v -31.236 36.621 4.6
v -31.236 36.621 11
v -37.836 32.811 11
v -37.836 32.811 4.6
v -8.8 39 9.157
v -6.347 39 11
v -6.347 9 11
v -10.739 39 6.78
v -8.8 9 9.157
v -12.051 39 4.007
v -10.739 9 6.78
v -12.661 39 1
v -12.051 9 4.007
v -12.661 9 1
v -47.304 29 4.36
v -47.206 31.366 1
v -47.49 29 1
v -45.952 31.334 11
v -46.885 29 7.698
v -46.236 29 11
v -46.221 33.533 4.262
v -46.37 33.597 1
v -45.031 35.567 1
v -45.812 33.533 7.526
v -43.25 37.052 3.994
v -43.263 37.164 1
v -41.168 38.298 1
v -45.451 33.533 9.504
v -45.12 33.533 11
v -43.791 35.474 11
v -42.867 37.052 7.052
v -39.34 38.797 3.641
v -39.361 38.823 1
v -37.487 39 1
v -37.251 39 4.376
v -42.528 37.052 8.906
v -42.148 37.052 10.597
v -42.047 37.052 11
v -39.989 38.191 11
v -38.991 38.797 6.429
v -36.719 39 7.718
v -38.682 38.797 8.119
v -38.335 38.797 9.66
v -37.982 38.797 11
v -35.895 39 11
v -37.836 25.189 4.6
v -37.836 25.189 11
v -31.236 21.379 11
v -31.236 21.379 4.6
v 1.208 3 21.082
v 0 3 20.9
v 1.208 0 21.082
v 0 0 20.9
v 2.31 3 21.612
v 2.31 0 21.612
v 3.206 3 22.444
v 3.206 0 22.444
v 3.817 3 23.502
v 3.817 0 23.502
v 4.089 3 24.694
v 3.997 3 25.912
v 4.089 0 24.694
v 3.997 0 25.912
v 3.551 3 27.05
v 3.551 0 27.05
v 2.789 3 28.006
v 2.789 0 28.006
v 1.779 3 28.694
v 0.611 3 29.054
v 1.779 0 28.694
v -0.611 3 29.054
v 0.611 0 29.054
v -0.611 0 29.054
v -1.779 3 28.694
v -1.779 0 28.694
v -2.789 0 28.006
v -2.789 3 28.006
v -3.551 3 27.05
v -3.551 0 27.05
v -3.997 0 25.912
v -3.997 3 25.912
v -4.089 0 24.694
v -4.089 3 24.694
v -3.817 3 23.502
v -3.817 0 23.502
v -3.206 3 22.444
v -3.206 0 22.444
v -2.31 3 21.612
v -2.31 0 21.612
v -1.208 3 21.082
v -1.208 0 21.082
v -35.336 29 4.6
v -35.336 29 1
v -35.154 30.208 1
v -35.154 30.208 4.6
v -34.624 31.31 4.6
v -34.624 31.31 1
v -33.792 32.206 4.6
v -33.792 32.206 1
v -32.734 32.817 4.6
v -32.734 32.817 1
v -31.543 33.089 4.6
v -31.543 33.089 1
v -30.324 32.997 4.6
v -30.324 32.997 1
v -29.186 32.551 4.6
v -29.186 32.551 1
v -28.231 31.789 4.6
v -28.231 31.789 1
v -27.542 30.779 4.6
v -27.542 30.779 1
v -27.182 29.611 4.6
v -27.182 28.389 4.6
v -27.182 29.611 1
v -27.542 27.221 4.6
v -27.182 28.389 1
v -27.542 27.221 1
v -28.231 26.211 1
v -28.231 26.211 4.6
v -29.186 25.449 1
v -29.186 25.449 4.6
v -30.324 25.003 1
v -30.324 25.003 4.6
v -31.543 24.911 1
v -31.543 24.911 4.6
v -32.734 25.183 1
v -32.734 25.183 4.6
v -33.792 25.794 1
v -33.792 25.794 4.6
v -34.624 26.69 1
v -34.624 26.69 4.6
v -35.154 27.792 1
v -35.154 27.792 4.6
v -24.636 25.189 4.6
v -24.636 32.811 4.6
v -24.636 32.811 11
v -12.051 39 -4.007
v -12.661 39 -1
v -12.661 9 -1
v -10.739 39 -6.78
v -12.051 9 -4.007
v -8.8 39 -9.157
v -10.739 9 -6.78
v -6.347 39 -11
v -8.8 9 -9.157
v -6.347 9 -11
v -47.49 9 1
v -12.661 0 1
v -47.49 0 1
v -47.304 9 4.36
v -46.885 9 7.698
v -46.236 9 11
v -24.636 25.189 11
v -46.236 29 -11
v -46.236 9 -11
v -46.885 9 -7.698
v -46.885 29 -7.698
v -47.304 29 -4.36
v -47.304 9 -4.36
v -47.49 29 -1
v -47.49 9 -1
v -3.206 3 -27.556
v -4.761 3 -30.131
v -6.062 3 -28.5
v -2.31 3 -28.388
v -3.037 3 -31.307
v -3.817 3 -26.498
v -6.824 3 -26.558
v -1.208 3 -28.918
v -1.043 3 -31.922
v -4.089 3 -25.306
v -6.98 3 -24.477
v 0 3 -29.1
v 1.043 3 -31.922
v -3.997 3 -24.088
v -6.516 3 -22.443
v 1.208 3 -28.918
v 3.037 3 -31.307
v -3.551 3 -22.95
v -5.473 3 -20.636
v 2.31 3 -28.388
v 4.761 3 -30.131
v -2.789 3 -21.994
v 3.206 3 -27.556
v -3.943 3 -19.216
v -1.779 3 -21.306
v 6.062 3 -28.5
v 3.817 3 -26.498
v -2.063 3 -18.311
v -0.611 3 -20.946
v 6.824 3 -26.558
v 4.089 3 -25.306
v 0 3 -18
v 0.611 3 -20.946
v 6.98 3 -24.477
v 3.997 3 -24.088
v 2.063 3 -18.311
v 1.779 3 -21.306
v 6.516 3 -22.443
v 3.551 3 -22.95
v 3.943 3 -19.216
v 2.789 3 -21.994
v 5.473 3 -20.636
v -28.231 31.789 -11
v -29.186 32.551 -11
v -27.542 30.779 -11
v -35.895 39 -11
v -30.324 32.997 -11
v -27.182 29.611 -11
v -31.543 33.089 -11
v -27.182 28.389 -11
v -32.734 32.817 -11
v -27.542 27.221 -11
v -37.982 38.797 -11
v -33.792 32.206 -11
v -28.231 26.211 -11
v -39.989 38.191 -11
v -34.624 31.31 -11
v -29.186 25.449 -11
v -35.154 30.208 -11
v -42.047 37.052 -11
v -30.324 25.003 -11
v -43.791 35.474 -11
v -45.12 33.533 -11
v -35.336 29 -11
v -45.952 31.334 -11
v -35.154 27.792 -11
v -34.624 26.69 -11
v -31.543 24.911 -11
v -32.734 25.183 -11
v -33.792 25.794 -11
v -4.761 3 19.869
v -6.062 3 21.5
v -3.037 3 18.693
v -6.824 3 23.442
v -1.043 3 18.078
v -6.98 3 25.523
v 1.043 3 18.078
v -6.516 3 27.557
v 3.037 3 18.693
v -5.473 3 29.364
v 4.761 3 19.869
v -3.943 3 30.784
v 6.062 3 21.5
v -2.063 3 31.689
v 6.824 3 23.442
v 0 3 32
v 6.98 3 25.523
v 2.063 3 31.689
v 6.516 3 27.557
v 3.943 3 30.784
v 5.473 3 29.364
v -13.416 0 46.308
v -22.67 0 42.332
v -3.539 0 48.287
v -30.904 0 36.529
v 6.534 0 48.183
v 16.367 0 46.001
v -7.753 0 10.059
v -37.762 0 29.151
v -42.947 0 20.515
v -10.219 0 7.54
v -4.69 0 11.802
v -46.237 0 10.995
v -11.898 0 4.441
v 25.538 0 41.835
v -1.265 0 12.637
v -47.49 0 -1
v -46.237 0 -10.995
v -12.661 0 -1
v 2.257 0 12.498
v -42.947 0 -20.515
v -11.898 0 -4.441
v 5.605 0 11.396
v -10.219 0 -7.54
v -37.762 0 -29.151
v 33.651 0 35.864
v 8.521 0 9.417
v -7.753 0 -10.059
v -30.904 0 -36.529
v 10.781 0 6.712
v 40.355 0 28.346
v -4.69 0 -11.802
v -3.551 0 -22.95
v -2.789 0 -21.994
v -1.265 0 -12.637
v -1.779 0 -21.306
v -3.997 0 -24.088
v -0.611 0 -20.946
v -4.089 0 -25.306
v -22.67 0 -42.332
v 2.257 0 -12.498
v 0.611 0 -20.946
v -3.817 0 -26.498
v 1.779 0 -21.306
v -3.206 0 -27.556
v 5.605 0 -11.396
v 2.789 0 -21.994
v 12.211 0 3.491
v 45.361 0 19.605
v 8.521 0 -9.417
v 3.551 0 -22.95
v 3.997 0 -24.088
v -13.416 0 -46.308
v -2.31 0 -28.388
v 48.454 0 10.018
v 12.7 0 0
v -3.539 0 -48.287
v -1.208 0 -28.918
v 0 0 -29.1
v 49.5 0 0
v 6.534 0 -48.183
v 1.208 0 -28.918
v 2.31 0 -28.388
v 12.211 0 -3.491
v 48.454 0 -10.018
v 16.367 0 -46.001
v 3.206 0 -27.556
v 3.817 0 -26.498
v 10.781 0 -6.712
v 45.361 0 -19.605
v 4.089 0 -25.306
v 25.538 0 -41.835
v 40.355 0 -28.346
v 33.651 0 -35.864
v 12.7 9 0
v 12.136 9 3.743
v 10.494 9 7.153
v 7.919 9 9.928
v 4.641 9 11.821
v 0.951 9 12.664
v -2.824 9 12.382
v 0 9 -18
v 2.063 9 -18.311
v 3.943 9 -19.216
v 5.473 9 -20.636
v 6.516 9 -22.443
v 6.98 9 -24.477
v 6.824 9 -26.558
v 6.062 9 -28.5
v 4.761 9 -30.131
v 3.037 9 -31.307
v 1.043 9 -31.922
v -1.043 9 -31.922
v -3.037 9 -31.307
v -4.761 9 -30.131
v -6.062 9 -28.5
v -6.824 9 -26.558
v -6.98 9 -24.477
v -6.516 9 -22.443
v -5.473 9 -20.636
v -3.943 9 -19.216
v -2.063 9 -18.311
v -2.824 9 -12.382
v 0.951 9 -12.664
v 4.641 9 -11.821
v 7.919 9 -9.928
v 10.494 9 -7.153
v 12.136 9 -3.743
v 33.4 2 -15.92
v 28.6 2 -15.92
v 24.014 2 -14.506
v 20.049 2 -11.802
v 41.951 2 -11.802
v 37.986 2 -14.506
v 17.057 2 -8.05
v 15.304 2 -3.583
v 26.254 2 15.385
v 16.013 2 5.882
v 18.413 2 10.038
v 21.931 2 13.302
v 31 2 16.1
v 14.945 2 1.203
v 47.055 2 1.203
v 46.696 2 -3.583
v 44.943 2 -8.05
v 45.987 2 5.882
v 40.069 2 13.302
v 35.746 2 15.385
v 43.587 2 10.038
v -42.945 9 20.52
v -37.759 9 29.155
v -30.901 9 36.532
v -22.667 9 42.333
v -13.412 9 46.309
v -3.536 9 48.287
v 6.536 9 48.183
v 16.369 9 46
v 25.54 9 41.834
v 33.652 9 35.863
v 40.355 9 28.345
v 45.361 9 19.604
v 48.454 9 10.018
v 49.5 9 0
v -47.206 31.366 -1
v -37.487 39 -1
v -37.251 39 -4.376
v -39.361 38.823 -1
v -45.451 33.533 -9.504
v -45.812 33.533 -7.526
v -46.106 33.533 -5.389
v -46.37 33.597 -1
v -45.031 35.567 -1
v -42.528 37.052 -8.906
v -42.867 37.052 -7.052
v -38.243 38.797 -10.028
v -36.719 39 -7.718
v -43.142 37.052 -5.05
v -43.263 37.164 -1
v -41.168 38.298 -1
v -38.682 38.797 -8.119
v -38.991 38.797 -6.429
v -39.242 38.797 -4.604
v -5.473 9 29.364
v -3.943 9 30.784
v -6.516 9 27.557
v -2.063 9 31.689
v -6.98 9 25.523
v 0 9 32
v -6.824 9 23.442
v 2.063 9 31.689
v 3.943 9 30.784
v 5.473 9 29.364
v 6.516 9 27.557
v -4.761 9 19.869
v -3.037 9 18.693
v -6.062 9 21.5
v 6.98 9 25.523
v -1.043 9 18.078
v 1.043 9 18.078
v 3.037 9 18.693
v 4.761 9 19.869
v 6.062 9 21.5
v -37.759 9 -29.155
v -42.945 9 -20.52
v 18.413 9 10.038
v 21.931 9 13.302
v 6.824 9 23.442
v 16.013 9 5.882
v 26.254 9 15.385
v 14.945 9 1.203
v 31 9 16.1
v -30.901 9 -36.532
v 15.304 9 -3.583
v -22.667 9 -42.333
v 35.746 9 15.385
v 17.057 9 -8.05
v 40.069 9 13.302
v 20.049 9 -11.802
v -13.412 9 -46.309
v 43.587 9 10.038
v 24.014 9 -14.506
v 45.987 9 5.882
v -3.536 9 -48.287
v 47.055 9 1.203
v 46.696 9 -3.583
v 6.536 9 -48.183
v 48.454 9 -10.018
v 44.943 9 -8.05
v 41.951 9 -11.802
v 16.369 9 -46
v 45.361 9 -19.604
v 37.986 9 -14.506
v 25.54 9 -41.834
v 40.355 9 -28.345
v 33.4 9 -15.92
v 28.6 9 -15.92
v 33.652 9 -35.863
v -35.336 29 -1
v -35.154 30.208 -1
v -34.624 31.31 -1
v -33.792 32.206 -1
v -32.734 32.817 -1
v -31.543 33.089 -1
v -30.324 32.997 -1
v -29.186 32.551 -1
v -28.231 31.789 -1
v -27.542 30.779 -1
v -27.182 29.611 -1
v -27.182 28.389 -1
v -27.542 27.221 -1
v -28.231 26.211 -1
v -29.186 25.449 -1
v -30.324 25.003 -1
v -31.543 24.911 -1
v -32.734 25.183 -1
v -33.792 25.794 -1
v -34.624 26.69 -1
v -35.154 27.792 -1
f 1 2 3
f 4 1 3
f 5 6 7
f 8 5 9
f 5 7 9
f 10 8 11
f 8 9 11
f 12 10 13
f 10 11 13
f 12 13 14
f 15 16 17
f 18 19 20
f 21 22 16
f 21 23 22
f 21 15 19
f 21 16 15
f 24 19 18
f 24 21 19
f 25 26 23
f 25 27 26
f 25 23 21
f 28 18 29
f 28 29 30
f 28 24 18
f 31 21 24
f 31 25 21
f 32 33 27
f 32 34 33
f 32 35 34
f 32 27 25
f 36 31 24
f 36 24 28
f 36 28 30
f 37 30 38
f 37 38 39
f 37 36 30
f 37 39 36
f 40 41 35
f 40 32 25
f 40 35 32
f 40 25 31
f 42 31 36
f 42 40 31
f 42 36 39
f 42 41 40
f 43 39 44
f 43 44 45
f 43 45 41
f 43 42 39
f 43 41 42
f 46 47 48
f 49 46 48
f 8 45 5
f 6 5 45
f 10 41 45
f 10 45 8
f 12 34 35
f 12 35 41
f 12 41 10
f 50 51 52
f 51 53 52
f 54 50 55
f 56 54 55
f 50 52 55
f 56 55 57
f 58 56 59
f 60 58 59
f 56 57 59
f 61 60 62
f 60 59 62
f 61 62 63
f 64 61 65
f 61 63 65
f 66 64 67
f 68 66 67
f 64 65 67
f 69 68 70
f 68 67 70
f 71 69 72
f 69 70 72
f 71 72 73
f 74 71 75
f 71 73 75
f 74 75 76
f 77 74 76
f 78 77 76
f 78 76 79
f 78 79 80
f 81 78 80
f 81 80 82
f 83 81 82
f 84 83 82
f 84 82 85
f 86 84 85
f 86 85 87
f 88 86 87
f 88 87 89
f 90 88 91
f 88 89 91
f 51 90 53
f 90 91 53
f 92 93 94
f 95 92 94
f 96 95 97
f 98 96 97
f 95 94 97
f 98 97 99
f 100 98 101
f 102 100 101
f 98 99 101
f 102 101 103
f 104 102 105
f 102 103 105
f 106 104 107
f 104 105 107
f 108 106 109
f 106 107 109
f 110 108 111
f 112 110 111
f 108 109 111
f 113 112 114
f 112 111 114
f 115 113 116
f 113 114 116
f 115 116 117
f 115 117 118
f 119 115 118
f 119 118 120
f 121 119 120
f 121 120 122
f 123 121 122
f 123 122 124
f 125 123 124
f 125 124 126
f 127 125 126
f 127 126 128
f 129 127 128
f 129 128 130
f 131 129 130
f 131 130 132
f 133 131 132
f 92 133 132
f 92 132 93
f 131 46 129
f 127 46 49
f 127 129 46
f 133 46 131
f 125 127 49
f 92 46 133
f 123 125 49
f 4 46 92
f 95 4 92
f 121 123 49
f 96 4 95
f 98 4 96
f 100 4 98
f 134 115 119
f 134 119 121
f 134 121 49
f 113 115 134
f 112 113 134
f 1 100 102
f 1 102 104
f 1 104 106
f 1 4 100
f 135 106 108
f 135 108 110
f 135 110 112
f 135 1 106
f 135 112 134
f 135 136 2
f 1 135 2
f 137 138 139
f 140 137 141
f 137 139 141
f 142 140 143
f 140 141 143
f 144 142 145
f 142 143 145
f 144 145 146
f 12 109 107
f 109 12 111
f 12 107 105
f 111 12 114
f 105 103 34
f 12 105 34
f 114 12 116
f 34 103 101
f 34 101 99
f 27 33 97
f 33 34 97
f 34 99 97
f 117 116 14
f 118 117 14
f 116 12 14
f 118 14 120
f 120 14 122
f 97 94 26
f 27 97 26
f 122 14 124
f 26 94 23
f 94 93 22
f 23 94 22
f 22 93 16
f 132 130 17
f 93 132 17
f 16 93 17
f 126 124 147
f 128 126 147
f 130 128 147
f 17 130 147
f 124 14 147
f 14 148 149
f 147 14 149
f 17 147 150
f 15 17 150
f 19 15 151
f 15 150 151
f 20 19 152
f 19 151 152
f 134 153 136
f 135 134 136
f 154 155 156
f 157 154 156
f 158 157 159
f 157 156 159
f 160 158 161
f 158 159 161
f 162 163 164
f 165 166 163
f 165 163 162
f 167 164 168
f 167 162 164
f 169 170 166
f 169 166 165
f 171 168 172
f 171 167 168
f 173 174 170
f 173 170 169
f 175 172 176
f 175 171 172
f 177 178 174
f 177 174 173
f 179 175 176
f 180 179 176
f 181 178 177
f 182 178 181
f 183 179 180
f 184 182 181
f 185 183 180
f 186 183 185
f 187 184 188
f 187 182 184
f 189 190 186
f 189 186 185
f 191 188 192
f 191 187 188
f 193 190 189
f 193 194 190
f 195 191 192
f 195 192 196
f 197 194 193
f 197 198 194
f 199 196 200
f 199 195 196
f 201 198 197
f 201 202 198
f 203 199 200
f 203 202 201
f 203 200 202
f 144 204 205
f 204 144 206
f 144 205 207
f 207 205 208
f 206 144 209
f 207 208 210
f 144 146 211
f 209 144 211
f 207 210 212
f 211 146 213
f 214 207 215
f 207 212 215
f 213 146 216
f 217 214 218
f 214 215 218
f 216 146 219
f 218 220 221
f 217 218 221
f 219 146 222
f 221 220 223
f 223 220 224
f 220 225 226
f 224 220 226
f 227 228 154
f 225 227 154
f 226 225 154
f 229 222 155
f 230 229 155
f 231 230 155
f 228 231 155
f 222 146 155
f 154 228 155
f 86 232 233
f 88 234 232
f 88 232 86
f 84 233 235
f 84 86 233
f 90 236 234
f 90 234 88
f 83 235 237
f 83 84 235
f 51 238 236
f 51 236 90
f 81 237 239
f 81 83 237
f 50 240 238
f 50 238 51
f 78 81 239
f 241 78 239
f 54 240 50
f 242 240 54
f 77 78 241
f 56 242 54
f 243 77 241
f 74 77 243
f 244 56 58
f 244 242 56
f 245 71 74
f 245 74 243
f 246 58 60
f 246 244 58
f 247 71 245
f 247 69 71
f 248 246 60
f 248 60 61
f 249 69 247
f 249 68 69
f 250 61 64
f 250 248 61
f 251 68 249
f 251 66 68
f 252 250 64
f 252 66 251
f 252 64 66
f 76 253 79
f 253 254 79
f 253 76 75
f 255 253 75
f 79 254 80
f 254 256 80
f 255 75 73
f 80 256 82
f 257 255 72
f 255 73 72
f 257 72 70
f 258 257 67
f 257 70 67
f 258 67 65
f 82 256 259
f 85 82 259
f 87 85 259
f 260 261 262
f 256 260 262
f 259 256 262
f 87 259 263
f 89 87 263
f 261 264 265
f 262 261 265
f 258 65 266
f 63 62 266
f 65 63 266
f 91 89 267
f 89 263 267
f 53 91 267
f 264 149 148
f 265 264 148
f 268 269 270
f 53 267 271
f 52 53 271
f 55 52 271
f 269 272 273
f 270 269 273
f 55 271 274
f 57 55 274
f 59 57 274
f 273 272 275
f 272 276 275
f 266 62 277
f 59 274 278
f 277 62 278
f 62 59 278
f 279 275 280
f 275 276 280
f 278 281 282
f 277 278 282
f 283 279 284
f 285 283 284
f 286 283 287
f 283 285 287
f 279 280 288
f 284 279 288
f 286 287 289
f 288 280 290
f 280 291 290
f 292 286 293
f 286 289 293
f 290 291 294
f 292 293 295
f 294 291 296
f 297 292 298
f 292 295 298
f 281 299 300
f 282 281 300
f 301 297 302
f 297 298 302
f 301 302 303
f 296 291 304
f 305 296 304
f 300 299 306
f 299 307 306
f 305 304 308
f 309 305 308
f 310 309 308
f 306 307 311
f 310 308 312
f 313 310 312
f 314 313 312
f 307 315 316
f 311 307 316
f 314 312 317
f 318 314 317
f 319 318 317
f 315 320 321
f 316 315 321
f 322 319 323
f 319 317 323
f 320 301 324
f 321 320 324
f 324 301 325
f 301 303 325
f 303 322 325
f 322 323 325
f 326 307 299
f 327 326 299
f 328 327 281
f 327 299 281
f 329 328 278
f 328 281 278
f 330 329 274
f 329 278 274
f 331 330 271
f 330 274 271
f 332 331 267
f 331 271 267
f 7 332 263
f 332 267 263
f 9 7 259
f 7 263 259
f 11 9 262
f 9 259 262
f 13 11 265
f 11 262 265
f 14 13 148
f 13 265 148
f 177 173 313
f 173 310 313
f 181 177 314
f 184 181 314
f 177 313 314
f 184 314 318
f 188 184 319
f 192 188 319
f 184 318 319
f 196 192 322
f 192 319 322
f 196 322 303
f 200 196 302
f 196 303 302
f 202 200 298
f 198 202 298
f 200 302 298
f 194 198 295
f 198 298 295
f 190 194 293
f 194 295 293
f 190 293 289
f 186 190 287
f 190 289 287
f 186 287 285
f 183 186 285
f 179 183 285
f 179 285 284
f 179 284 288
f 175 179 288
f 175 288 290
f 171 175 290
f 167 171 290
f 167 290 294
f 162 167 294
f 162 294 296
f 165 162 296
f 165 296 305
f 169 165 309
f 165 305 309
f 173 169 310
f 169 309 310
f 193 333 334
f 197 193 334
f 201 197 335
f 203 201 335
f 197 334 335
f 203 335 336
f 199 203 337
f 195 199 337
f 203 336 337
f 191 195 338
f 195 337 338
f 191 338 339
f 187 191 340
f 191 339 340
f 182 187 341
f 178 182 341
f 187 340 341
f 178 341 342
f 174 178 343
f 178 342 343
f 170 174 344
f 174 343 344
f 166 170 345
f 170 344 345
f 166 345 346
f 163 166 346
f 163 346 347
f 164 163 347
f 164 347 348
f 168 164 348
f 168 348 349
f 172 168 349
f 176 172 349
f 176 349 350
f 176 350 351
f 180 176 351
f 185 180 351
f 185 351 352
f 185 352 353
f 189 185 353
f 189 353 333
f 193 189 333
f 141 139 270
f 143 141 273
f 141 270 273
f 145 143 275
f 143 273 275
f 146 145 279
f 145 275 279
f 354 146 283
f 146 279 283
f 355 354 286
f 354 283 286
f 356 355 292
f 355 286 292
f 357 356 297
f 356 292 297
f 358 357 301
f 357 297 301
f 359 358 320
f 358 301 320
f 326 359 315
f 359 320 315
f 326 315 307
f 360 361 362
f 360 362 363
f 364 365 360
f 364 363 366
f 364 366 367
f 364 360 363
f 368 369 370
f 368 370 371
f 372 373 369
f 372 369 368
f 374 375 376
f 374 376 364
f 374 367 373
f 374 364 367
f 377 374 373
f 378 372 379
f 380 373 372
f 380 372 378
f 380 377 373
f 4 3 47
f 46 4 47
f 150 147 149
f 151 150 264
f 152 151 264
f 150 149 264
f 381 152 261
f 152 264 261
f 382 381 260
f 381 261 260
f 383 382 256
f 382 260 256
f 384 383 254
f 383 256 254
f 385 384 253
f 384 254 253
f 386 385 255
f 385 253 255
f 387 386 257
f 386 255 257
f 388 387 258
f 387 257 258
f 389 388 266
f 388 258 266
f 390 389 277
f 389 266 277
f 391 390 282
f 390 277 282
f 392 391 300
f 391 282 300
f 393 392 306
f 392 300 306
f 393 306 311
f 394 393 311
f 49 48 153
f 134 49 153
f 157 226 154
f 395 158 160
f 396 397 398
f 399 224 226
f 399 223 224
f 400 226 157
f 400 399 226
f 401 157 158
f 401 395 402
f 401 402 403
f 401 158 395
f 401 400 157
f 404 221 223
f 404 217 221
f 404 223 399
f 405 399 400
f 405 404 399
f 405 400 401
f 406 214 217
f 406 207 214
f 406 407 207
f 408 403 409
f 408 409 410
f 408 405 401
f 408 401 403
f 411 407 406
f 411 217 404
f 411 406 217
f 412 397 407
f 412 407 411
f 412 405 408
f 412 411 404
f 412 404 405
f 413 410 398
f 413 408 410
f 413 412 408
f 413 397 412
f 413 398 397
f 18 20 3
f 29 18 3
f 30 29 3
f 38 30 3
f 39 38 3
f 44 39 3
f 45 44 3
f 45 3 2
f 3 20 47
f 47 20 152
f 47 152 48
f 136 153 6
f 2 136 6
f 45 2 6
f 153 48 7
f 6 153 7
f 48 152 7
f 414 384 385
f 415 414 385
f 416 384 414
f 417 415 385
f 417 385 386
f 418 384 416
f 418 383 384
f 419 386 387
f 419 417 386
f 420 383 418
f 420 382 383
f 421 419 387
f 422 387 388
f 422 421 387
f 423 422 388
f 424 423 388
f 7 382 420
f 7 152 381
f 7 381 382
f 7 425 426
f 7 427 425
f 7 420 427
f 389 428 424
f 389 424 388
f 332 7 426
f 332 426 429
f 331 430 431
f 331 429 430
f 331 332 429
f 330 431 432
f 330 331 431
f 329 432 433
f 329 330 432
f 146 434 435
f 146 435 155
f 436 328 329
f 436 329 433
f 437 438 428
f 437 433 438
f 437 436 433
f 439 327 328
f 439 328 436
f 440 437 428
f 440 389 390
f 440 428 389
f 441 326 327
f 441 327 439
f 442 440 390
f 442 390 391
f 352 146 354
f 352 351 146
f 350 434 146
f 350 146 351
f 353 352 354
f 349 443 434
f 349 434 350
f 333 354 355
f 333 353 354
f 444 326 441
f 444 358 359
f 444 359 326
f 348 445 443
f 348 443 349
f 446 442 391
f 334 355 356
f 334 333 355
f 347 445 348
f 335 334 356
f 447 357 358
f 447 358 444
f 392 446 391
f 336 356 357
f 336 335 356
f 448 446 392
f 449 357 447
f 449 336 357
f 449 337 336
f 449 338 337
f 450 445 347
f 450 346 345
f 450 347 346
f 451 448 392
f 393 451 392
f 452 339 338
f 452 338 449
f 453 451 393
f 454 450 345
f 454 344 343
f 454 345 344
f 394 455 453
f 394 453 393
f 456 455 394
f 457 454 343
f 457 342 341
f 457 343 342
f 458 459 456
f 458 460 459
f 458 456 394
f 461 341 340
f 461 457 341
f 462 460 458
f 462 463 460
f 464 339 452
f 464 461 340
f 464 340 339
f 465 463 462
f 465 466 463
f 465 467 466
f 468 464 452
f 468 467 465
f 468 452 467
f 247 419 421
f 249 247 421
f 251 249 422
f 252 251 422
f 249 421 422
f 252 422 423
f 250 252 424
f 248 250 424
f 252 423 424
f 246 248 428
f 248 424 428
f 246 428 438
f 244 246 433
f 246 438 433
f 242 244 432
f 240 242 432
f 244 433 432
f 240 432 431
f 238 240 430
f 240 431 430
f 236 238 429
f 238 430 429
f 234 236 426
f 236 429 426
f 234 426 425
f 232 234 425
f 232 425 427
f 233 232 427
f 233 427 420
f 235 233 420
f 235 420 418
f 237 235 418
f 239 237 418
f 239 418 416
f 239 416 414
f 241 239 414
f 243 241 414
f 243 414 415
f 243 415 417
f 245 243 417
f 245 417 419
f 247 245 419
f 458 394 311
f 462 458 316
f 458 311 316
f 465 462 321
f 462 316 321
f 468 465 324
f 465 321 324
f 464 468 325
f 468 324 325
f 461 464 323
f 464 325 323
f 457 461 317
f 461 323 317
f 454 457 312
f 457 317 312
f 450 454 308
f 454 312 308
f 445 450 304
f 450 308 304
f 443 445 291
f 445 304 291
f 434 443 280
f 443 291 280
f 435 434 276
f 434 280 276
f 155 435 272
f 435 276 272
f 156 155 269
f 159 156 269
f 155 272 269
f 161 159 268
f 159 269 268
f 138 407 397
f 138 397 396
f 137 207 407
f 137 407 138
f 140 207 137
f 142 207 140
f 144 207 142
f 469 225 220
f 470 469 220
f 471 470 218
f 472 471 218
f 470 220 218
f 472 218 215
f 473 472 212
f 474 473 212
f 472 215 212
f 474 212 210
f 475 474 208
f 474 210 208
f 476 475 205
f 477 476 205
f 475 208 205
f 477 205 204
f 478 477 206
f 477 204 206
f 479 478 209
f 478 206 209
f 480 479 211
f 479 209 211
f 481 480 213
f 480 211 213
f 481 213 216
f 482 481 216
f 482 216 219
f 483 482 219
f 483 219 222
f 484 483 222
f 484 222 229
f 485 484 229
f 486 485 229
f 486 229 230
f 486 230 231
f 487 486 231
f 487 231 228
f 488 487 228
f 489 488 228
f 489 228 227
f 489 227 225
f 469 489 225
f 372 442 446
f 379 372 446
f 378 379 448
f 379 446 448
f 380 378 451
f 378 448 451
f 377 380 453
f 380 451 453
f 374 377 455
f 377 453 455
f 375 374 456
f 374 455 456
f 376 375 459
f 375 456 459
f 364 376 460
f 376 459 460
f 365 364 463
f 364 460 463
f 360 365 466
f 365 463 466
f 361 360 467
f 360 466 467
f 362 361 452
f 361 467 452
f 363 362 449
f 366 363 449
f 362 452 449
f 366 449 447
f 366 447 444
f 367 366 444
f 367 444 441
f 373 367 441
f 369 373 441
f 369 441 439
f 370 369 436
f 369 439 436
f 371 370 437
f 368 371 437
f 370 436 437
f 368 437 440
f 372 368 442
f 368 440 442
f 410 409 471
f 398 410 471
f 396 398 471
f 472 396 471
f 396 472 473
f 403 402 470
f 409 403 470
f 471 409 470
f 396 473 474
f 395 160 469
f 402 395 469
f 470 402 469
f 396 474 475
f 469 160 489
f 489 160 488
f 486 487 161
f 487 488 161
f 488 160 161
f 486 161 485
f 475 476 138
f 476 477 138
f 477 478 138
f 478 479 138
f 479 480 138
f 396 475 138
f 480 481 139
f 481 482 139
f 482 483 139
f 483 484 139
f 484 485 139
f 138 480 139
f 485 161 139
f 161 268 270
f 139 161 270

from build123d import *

# Parameters (mm, degrees)
BOSS_EXTRUDE2_DEPTH                     = 9
SKETCH4_R                               = 16.1
CUT_EXTRUDE1_DEPTH                      = 7
CBORE_FOR_M8_HEX_HEAD_BOLT1_D           = 8.2
CBORE_FOR_M8_HEX_HEAD_BOLT1_DEPTH       = 10
CBORE_FOR_M8_HEX_HEAD_BOLT1_CBORE_D     = 14
CBORE_FOR_M8_HEX_HEAD_BOLT1_CBORE_DEPTH = 6
CBORE_FOR_M8_HEX_HEAD_BOLT1_TIP         = 2.463528538
BOSS_EXTRUDE3_DEPTH                     = 30
SKETCH8_R                               = 4.1
CUT_EXTRUDE2_DEPTH                      = 87.668910227
CUT_EXTRUDE3_DEPTH                      = 6.4
FILLET1_R                               = 10


with BuildPart() as part:
    # Sketch2 → Boss-Extrude2 (new body)
    with BuildSketch(Plane(origin=(0, 0, 0), x_dir=(1, 0, 0), z_dir=(0, 1, 0))):
        with BuildLine():
            Line((-47.489689626, 1), (-12.660568708, 1))
            ThreePointArc((-12.660568708, 1), (0.500388556, 12.690138348), (12.7, 0))
            ThreePointArc((12.7, 0), (0.500388556, -12.690138348), (-12.660568708, -1))
            Line((-12.660568708, -1), (-47.489689626, -1))
            ThreePointArc((-47.489689626, -1), (1.500026575, -48.497422338), (49.5, 0))
            ThreePointArc((49.5, 0), (1.500026575, 48.497422338), (-47.489689626, 1))
        make_face()
    extrude(amount=BOSS_EXTRUDE2_DEPTH)

    # Sketch4 → Cut-Extrude1 (cut)
    with BuildSketch(Plane(origin=(0, 9, 0), x_dir=(1, 0, 0), z_dir=(0, 1, 0))):
        with Locations(Location((31, 0, 0), (0, 0, 270))):
            Circle(SKETCH4_R)
    extrude(amount=-CUT_EXTRUDE1_DEPTH, mode=Mode.SUBTRACT)

    # CBORE for M8 Hex Head Bolt1
    with Locations(Plane(origin=(0, 9, 25), x_dir=(0, 0, 1), z_dir=(0, 1, 0))):
        with Locations((0, 0), (-50, 0)):
            CounterBoreHole(CBORE_FOR_M8_HEX_HEAD_BOLT1_D / 2, CBORE_FOR_M8_HEX_HEAD_BOLT1_CBORE_D / 2, CBORE_FOR_M8_HEX_HEAD_BOLT1_CBORE_DEPTH, depth=CBORE_FOR_M8_HEX_HEAD_BOLT1_DEPTH)
            with Locations((0, 0, -(CBORE_FOR_M8_HEX_HEAD_BOLT1_DEPTH + CBORE_FOR_M8_HEX_HEAD_BOLT1_TIP / 2))):  # 118° drill point
                Cone(0, CBORE_FOR_M8_HEX_HEAD_BOLT1_D / 2, CBORE_FOR_M8_HEX_HEAD_BOLT1_TIP, mode=Mode.SUBTRACT)

    # Sketch7 → Boss-Extrude3 (add)
    with BuildSketch(Plane(origin=(0, 9, 0), x_dir=(1, 0, 0), z_dir=(0, 1, 0))):
        with BuildLine():
            Line((-46.236109069, -11), (-6.347440429, -11))
            ThreePointArc((-6.347440429, -11), (-10.738999154, -6.779667924), (-12.660568708, -1))
            Line((-12.660568708, -1), (-47.489689626, -1))
            ThreePointArc((-47.489689626, -1), (-47.123353312, -6.032650003), (-46.236109069, -11))
        make_face()
        with BuildLine():
            Line((-47.489689626, 1), (-12.660568708, 1))
            ThreePointArc((-12.660568708, 1), (-10.738999154, 6.779667924), (-6.347440429, 11))
            Line((-6.347440429, 11), (-46.236109069, 11))
            ThreePointArc((-46.236109069, 11), (-47.123353312, 6.032650003), (-47.489689626, 1))
        make_face()
    extrude(amount=BOSS_EXTRUDE3_DEPTH)

    # Sketch8 → Cut-Extrude2 (cut, through all)
    with BuildSketch(Plane(origin=(0, 0, -11), x_dir=(-1, 0, 0), z_dir=(0, 0, -1))):
        with Locations((31.236109069, 29)):
            Circle(SKETCH8_R)
    extrude(amount=-CUT_EXTRUDE2_DEPTH, mode=Mode.SUBTRACT)

    # Sketch9 → Cut-Extrude3 (cut)
    with BuildSketch(Plane.XY.offset(11)):
        Polygon((-24.636109069, 25.189488223), (-24.636109069, 32.810511777), (-31.236109069, 36.621023553), (-37.836109069, 32.810511777), (-37.836109069, 25.189488223), (-31.236109069, 21.378976447), align=None)
    extrude(amount=-CUT_EXTRUDE3_DEPTH, mode=Mode.SUBTRACT)

    # Fillet1
    fillet1_edges = [part.edges().sort_by_distance(p)[0] for p in [
        (-47.123353312, 39, 6.032650003),
        (-47.123353312, 39, -6.032650003),
    ]]
    fillet(fillet1_edges, radius=FILLET1_R)


solid = part.part
